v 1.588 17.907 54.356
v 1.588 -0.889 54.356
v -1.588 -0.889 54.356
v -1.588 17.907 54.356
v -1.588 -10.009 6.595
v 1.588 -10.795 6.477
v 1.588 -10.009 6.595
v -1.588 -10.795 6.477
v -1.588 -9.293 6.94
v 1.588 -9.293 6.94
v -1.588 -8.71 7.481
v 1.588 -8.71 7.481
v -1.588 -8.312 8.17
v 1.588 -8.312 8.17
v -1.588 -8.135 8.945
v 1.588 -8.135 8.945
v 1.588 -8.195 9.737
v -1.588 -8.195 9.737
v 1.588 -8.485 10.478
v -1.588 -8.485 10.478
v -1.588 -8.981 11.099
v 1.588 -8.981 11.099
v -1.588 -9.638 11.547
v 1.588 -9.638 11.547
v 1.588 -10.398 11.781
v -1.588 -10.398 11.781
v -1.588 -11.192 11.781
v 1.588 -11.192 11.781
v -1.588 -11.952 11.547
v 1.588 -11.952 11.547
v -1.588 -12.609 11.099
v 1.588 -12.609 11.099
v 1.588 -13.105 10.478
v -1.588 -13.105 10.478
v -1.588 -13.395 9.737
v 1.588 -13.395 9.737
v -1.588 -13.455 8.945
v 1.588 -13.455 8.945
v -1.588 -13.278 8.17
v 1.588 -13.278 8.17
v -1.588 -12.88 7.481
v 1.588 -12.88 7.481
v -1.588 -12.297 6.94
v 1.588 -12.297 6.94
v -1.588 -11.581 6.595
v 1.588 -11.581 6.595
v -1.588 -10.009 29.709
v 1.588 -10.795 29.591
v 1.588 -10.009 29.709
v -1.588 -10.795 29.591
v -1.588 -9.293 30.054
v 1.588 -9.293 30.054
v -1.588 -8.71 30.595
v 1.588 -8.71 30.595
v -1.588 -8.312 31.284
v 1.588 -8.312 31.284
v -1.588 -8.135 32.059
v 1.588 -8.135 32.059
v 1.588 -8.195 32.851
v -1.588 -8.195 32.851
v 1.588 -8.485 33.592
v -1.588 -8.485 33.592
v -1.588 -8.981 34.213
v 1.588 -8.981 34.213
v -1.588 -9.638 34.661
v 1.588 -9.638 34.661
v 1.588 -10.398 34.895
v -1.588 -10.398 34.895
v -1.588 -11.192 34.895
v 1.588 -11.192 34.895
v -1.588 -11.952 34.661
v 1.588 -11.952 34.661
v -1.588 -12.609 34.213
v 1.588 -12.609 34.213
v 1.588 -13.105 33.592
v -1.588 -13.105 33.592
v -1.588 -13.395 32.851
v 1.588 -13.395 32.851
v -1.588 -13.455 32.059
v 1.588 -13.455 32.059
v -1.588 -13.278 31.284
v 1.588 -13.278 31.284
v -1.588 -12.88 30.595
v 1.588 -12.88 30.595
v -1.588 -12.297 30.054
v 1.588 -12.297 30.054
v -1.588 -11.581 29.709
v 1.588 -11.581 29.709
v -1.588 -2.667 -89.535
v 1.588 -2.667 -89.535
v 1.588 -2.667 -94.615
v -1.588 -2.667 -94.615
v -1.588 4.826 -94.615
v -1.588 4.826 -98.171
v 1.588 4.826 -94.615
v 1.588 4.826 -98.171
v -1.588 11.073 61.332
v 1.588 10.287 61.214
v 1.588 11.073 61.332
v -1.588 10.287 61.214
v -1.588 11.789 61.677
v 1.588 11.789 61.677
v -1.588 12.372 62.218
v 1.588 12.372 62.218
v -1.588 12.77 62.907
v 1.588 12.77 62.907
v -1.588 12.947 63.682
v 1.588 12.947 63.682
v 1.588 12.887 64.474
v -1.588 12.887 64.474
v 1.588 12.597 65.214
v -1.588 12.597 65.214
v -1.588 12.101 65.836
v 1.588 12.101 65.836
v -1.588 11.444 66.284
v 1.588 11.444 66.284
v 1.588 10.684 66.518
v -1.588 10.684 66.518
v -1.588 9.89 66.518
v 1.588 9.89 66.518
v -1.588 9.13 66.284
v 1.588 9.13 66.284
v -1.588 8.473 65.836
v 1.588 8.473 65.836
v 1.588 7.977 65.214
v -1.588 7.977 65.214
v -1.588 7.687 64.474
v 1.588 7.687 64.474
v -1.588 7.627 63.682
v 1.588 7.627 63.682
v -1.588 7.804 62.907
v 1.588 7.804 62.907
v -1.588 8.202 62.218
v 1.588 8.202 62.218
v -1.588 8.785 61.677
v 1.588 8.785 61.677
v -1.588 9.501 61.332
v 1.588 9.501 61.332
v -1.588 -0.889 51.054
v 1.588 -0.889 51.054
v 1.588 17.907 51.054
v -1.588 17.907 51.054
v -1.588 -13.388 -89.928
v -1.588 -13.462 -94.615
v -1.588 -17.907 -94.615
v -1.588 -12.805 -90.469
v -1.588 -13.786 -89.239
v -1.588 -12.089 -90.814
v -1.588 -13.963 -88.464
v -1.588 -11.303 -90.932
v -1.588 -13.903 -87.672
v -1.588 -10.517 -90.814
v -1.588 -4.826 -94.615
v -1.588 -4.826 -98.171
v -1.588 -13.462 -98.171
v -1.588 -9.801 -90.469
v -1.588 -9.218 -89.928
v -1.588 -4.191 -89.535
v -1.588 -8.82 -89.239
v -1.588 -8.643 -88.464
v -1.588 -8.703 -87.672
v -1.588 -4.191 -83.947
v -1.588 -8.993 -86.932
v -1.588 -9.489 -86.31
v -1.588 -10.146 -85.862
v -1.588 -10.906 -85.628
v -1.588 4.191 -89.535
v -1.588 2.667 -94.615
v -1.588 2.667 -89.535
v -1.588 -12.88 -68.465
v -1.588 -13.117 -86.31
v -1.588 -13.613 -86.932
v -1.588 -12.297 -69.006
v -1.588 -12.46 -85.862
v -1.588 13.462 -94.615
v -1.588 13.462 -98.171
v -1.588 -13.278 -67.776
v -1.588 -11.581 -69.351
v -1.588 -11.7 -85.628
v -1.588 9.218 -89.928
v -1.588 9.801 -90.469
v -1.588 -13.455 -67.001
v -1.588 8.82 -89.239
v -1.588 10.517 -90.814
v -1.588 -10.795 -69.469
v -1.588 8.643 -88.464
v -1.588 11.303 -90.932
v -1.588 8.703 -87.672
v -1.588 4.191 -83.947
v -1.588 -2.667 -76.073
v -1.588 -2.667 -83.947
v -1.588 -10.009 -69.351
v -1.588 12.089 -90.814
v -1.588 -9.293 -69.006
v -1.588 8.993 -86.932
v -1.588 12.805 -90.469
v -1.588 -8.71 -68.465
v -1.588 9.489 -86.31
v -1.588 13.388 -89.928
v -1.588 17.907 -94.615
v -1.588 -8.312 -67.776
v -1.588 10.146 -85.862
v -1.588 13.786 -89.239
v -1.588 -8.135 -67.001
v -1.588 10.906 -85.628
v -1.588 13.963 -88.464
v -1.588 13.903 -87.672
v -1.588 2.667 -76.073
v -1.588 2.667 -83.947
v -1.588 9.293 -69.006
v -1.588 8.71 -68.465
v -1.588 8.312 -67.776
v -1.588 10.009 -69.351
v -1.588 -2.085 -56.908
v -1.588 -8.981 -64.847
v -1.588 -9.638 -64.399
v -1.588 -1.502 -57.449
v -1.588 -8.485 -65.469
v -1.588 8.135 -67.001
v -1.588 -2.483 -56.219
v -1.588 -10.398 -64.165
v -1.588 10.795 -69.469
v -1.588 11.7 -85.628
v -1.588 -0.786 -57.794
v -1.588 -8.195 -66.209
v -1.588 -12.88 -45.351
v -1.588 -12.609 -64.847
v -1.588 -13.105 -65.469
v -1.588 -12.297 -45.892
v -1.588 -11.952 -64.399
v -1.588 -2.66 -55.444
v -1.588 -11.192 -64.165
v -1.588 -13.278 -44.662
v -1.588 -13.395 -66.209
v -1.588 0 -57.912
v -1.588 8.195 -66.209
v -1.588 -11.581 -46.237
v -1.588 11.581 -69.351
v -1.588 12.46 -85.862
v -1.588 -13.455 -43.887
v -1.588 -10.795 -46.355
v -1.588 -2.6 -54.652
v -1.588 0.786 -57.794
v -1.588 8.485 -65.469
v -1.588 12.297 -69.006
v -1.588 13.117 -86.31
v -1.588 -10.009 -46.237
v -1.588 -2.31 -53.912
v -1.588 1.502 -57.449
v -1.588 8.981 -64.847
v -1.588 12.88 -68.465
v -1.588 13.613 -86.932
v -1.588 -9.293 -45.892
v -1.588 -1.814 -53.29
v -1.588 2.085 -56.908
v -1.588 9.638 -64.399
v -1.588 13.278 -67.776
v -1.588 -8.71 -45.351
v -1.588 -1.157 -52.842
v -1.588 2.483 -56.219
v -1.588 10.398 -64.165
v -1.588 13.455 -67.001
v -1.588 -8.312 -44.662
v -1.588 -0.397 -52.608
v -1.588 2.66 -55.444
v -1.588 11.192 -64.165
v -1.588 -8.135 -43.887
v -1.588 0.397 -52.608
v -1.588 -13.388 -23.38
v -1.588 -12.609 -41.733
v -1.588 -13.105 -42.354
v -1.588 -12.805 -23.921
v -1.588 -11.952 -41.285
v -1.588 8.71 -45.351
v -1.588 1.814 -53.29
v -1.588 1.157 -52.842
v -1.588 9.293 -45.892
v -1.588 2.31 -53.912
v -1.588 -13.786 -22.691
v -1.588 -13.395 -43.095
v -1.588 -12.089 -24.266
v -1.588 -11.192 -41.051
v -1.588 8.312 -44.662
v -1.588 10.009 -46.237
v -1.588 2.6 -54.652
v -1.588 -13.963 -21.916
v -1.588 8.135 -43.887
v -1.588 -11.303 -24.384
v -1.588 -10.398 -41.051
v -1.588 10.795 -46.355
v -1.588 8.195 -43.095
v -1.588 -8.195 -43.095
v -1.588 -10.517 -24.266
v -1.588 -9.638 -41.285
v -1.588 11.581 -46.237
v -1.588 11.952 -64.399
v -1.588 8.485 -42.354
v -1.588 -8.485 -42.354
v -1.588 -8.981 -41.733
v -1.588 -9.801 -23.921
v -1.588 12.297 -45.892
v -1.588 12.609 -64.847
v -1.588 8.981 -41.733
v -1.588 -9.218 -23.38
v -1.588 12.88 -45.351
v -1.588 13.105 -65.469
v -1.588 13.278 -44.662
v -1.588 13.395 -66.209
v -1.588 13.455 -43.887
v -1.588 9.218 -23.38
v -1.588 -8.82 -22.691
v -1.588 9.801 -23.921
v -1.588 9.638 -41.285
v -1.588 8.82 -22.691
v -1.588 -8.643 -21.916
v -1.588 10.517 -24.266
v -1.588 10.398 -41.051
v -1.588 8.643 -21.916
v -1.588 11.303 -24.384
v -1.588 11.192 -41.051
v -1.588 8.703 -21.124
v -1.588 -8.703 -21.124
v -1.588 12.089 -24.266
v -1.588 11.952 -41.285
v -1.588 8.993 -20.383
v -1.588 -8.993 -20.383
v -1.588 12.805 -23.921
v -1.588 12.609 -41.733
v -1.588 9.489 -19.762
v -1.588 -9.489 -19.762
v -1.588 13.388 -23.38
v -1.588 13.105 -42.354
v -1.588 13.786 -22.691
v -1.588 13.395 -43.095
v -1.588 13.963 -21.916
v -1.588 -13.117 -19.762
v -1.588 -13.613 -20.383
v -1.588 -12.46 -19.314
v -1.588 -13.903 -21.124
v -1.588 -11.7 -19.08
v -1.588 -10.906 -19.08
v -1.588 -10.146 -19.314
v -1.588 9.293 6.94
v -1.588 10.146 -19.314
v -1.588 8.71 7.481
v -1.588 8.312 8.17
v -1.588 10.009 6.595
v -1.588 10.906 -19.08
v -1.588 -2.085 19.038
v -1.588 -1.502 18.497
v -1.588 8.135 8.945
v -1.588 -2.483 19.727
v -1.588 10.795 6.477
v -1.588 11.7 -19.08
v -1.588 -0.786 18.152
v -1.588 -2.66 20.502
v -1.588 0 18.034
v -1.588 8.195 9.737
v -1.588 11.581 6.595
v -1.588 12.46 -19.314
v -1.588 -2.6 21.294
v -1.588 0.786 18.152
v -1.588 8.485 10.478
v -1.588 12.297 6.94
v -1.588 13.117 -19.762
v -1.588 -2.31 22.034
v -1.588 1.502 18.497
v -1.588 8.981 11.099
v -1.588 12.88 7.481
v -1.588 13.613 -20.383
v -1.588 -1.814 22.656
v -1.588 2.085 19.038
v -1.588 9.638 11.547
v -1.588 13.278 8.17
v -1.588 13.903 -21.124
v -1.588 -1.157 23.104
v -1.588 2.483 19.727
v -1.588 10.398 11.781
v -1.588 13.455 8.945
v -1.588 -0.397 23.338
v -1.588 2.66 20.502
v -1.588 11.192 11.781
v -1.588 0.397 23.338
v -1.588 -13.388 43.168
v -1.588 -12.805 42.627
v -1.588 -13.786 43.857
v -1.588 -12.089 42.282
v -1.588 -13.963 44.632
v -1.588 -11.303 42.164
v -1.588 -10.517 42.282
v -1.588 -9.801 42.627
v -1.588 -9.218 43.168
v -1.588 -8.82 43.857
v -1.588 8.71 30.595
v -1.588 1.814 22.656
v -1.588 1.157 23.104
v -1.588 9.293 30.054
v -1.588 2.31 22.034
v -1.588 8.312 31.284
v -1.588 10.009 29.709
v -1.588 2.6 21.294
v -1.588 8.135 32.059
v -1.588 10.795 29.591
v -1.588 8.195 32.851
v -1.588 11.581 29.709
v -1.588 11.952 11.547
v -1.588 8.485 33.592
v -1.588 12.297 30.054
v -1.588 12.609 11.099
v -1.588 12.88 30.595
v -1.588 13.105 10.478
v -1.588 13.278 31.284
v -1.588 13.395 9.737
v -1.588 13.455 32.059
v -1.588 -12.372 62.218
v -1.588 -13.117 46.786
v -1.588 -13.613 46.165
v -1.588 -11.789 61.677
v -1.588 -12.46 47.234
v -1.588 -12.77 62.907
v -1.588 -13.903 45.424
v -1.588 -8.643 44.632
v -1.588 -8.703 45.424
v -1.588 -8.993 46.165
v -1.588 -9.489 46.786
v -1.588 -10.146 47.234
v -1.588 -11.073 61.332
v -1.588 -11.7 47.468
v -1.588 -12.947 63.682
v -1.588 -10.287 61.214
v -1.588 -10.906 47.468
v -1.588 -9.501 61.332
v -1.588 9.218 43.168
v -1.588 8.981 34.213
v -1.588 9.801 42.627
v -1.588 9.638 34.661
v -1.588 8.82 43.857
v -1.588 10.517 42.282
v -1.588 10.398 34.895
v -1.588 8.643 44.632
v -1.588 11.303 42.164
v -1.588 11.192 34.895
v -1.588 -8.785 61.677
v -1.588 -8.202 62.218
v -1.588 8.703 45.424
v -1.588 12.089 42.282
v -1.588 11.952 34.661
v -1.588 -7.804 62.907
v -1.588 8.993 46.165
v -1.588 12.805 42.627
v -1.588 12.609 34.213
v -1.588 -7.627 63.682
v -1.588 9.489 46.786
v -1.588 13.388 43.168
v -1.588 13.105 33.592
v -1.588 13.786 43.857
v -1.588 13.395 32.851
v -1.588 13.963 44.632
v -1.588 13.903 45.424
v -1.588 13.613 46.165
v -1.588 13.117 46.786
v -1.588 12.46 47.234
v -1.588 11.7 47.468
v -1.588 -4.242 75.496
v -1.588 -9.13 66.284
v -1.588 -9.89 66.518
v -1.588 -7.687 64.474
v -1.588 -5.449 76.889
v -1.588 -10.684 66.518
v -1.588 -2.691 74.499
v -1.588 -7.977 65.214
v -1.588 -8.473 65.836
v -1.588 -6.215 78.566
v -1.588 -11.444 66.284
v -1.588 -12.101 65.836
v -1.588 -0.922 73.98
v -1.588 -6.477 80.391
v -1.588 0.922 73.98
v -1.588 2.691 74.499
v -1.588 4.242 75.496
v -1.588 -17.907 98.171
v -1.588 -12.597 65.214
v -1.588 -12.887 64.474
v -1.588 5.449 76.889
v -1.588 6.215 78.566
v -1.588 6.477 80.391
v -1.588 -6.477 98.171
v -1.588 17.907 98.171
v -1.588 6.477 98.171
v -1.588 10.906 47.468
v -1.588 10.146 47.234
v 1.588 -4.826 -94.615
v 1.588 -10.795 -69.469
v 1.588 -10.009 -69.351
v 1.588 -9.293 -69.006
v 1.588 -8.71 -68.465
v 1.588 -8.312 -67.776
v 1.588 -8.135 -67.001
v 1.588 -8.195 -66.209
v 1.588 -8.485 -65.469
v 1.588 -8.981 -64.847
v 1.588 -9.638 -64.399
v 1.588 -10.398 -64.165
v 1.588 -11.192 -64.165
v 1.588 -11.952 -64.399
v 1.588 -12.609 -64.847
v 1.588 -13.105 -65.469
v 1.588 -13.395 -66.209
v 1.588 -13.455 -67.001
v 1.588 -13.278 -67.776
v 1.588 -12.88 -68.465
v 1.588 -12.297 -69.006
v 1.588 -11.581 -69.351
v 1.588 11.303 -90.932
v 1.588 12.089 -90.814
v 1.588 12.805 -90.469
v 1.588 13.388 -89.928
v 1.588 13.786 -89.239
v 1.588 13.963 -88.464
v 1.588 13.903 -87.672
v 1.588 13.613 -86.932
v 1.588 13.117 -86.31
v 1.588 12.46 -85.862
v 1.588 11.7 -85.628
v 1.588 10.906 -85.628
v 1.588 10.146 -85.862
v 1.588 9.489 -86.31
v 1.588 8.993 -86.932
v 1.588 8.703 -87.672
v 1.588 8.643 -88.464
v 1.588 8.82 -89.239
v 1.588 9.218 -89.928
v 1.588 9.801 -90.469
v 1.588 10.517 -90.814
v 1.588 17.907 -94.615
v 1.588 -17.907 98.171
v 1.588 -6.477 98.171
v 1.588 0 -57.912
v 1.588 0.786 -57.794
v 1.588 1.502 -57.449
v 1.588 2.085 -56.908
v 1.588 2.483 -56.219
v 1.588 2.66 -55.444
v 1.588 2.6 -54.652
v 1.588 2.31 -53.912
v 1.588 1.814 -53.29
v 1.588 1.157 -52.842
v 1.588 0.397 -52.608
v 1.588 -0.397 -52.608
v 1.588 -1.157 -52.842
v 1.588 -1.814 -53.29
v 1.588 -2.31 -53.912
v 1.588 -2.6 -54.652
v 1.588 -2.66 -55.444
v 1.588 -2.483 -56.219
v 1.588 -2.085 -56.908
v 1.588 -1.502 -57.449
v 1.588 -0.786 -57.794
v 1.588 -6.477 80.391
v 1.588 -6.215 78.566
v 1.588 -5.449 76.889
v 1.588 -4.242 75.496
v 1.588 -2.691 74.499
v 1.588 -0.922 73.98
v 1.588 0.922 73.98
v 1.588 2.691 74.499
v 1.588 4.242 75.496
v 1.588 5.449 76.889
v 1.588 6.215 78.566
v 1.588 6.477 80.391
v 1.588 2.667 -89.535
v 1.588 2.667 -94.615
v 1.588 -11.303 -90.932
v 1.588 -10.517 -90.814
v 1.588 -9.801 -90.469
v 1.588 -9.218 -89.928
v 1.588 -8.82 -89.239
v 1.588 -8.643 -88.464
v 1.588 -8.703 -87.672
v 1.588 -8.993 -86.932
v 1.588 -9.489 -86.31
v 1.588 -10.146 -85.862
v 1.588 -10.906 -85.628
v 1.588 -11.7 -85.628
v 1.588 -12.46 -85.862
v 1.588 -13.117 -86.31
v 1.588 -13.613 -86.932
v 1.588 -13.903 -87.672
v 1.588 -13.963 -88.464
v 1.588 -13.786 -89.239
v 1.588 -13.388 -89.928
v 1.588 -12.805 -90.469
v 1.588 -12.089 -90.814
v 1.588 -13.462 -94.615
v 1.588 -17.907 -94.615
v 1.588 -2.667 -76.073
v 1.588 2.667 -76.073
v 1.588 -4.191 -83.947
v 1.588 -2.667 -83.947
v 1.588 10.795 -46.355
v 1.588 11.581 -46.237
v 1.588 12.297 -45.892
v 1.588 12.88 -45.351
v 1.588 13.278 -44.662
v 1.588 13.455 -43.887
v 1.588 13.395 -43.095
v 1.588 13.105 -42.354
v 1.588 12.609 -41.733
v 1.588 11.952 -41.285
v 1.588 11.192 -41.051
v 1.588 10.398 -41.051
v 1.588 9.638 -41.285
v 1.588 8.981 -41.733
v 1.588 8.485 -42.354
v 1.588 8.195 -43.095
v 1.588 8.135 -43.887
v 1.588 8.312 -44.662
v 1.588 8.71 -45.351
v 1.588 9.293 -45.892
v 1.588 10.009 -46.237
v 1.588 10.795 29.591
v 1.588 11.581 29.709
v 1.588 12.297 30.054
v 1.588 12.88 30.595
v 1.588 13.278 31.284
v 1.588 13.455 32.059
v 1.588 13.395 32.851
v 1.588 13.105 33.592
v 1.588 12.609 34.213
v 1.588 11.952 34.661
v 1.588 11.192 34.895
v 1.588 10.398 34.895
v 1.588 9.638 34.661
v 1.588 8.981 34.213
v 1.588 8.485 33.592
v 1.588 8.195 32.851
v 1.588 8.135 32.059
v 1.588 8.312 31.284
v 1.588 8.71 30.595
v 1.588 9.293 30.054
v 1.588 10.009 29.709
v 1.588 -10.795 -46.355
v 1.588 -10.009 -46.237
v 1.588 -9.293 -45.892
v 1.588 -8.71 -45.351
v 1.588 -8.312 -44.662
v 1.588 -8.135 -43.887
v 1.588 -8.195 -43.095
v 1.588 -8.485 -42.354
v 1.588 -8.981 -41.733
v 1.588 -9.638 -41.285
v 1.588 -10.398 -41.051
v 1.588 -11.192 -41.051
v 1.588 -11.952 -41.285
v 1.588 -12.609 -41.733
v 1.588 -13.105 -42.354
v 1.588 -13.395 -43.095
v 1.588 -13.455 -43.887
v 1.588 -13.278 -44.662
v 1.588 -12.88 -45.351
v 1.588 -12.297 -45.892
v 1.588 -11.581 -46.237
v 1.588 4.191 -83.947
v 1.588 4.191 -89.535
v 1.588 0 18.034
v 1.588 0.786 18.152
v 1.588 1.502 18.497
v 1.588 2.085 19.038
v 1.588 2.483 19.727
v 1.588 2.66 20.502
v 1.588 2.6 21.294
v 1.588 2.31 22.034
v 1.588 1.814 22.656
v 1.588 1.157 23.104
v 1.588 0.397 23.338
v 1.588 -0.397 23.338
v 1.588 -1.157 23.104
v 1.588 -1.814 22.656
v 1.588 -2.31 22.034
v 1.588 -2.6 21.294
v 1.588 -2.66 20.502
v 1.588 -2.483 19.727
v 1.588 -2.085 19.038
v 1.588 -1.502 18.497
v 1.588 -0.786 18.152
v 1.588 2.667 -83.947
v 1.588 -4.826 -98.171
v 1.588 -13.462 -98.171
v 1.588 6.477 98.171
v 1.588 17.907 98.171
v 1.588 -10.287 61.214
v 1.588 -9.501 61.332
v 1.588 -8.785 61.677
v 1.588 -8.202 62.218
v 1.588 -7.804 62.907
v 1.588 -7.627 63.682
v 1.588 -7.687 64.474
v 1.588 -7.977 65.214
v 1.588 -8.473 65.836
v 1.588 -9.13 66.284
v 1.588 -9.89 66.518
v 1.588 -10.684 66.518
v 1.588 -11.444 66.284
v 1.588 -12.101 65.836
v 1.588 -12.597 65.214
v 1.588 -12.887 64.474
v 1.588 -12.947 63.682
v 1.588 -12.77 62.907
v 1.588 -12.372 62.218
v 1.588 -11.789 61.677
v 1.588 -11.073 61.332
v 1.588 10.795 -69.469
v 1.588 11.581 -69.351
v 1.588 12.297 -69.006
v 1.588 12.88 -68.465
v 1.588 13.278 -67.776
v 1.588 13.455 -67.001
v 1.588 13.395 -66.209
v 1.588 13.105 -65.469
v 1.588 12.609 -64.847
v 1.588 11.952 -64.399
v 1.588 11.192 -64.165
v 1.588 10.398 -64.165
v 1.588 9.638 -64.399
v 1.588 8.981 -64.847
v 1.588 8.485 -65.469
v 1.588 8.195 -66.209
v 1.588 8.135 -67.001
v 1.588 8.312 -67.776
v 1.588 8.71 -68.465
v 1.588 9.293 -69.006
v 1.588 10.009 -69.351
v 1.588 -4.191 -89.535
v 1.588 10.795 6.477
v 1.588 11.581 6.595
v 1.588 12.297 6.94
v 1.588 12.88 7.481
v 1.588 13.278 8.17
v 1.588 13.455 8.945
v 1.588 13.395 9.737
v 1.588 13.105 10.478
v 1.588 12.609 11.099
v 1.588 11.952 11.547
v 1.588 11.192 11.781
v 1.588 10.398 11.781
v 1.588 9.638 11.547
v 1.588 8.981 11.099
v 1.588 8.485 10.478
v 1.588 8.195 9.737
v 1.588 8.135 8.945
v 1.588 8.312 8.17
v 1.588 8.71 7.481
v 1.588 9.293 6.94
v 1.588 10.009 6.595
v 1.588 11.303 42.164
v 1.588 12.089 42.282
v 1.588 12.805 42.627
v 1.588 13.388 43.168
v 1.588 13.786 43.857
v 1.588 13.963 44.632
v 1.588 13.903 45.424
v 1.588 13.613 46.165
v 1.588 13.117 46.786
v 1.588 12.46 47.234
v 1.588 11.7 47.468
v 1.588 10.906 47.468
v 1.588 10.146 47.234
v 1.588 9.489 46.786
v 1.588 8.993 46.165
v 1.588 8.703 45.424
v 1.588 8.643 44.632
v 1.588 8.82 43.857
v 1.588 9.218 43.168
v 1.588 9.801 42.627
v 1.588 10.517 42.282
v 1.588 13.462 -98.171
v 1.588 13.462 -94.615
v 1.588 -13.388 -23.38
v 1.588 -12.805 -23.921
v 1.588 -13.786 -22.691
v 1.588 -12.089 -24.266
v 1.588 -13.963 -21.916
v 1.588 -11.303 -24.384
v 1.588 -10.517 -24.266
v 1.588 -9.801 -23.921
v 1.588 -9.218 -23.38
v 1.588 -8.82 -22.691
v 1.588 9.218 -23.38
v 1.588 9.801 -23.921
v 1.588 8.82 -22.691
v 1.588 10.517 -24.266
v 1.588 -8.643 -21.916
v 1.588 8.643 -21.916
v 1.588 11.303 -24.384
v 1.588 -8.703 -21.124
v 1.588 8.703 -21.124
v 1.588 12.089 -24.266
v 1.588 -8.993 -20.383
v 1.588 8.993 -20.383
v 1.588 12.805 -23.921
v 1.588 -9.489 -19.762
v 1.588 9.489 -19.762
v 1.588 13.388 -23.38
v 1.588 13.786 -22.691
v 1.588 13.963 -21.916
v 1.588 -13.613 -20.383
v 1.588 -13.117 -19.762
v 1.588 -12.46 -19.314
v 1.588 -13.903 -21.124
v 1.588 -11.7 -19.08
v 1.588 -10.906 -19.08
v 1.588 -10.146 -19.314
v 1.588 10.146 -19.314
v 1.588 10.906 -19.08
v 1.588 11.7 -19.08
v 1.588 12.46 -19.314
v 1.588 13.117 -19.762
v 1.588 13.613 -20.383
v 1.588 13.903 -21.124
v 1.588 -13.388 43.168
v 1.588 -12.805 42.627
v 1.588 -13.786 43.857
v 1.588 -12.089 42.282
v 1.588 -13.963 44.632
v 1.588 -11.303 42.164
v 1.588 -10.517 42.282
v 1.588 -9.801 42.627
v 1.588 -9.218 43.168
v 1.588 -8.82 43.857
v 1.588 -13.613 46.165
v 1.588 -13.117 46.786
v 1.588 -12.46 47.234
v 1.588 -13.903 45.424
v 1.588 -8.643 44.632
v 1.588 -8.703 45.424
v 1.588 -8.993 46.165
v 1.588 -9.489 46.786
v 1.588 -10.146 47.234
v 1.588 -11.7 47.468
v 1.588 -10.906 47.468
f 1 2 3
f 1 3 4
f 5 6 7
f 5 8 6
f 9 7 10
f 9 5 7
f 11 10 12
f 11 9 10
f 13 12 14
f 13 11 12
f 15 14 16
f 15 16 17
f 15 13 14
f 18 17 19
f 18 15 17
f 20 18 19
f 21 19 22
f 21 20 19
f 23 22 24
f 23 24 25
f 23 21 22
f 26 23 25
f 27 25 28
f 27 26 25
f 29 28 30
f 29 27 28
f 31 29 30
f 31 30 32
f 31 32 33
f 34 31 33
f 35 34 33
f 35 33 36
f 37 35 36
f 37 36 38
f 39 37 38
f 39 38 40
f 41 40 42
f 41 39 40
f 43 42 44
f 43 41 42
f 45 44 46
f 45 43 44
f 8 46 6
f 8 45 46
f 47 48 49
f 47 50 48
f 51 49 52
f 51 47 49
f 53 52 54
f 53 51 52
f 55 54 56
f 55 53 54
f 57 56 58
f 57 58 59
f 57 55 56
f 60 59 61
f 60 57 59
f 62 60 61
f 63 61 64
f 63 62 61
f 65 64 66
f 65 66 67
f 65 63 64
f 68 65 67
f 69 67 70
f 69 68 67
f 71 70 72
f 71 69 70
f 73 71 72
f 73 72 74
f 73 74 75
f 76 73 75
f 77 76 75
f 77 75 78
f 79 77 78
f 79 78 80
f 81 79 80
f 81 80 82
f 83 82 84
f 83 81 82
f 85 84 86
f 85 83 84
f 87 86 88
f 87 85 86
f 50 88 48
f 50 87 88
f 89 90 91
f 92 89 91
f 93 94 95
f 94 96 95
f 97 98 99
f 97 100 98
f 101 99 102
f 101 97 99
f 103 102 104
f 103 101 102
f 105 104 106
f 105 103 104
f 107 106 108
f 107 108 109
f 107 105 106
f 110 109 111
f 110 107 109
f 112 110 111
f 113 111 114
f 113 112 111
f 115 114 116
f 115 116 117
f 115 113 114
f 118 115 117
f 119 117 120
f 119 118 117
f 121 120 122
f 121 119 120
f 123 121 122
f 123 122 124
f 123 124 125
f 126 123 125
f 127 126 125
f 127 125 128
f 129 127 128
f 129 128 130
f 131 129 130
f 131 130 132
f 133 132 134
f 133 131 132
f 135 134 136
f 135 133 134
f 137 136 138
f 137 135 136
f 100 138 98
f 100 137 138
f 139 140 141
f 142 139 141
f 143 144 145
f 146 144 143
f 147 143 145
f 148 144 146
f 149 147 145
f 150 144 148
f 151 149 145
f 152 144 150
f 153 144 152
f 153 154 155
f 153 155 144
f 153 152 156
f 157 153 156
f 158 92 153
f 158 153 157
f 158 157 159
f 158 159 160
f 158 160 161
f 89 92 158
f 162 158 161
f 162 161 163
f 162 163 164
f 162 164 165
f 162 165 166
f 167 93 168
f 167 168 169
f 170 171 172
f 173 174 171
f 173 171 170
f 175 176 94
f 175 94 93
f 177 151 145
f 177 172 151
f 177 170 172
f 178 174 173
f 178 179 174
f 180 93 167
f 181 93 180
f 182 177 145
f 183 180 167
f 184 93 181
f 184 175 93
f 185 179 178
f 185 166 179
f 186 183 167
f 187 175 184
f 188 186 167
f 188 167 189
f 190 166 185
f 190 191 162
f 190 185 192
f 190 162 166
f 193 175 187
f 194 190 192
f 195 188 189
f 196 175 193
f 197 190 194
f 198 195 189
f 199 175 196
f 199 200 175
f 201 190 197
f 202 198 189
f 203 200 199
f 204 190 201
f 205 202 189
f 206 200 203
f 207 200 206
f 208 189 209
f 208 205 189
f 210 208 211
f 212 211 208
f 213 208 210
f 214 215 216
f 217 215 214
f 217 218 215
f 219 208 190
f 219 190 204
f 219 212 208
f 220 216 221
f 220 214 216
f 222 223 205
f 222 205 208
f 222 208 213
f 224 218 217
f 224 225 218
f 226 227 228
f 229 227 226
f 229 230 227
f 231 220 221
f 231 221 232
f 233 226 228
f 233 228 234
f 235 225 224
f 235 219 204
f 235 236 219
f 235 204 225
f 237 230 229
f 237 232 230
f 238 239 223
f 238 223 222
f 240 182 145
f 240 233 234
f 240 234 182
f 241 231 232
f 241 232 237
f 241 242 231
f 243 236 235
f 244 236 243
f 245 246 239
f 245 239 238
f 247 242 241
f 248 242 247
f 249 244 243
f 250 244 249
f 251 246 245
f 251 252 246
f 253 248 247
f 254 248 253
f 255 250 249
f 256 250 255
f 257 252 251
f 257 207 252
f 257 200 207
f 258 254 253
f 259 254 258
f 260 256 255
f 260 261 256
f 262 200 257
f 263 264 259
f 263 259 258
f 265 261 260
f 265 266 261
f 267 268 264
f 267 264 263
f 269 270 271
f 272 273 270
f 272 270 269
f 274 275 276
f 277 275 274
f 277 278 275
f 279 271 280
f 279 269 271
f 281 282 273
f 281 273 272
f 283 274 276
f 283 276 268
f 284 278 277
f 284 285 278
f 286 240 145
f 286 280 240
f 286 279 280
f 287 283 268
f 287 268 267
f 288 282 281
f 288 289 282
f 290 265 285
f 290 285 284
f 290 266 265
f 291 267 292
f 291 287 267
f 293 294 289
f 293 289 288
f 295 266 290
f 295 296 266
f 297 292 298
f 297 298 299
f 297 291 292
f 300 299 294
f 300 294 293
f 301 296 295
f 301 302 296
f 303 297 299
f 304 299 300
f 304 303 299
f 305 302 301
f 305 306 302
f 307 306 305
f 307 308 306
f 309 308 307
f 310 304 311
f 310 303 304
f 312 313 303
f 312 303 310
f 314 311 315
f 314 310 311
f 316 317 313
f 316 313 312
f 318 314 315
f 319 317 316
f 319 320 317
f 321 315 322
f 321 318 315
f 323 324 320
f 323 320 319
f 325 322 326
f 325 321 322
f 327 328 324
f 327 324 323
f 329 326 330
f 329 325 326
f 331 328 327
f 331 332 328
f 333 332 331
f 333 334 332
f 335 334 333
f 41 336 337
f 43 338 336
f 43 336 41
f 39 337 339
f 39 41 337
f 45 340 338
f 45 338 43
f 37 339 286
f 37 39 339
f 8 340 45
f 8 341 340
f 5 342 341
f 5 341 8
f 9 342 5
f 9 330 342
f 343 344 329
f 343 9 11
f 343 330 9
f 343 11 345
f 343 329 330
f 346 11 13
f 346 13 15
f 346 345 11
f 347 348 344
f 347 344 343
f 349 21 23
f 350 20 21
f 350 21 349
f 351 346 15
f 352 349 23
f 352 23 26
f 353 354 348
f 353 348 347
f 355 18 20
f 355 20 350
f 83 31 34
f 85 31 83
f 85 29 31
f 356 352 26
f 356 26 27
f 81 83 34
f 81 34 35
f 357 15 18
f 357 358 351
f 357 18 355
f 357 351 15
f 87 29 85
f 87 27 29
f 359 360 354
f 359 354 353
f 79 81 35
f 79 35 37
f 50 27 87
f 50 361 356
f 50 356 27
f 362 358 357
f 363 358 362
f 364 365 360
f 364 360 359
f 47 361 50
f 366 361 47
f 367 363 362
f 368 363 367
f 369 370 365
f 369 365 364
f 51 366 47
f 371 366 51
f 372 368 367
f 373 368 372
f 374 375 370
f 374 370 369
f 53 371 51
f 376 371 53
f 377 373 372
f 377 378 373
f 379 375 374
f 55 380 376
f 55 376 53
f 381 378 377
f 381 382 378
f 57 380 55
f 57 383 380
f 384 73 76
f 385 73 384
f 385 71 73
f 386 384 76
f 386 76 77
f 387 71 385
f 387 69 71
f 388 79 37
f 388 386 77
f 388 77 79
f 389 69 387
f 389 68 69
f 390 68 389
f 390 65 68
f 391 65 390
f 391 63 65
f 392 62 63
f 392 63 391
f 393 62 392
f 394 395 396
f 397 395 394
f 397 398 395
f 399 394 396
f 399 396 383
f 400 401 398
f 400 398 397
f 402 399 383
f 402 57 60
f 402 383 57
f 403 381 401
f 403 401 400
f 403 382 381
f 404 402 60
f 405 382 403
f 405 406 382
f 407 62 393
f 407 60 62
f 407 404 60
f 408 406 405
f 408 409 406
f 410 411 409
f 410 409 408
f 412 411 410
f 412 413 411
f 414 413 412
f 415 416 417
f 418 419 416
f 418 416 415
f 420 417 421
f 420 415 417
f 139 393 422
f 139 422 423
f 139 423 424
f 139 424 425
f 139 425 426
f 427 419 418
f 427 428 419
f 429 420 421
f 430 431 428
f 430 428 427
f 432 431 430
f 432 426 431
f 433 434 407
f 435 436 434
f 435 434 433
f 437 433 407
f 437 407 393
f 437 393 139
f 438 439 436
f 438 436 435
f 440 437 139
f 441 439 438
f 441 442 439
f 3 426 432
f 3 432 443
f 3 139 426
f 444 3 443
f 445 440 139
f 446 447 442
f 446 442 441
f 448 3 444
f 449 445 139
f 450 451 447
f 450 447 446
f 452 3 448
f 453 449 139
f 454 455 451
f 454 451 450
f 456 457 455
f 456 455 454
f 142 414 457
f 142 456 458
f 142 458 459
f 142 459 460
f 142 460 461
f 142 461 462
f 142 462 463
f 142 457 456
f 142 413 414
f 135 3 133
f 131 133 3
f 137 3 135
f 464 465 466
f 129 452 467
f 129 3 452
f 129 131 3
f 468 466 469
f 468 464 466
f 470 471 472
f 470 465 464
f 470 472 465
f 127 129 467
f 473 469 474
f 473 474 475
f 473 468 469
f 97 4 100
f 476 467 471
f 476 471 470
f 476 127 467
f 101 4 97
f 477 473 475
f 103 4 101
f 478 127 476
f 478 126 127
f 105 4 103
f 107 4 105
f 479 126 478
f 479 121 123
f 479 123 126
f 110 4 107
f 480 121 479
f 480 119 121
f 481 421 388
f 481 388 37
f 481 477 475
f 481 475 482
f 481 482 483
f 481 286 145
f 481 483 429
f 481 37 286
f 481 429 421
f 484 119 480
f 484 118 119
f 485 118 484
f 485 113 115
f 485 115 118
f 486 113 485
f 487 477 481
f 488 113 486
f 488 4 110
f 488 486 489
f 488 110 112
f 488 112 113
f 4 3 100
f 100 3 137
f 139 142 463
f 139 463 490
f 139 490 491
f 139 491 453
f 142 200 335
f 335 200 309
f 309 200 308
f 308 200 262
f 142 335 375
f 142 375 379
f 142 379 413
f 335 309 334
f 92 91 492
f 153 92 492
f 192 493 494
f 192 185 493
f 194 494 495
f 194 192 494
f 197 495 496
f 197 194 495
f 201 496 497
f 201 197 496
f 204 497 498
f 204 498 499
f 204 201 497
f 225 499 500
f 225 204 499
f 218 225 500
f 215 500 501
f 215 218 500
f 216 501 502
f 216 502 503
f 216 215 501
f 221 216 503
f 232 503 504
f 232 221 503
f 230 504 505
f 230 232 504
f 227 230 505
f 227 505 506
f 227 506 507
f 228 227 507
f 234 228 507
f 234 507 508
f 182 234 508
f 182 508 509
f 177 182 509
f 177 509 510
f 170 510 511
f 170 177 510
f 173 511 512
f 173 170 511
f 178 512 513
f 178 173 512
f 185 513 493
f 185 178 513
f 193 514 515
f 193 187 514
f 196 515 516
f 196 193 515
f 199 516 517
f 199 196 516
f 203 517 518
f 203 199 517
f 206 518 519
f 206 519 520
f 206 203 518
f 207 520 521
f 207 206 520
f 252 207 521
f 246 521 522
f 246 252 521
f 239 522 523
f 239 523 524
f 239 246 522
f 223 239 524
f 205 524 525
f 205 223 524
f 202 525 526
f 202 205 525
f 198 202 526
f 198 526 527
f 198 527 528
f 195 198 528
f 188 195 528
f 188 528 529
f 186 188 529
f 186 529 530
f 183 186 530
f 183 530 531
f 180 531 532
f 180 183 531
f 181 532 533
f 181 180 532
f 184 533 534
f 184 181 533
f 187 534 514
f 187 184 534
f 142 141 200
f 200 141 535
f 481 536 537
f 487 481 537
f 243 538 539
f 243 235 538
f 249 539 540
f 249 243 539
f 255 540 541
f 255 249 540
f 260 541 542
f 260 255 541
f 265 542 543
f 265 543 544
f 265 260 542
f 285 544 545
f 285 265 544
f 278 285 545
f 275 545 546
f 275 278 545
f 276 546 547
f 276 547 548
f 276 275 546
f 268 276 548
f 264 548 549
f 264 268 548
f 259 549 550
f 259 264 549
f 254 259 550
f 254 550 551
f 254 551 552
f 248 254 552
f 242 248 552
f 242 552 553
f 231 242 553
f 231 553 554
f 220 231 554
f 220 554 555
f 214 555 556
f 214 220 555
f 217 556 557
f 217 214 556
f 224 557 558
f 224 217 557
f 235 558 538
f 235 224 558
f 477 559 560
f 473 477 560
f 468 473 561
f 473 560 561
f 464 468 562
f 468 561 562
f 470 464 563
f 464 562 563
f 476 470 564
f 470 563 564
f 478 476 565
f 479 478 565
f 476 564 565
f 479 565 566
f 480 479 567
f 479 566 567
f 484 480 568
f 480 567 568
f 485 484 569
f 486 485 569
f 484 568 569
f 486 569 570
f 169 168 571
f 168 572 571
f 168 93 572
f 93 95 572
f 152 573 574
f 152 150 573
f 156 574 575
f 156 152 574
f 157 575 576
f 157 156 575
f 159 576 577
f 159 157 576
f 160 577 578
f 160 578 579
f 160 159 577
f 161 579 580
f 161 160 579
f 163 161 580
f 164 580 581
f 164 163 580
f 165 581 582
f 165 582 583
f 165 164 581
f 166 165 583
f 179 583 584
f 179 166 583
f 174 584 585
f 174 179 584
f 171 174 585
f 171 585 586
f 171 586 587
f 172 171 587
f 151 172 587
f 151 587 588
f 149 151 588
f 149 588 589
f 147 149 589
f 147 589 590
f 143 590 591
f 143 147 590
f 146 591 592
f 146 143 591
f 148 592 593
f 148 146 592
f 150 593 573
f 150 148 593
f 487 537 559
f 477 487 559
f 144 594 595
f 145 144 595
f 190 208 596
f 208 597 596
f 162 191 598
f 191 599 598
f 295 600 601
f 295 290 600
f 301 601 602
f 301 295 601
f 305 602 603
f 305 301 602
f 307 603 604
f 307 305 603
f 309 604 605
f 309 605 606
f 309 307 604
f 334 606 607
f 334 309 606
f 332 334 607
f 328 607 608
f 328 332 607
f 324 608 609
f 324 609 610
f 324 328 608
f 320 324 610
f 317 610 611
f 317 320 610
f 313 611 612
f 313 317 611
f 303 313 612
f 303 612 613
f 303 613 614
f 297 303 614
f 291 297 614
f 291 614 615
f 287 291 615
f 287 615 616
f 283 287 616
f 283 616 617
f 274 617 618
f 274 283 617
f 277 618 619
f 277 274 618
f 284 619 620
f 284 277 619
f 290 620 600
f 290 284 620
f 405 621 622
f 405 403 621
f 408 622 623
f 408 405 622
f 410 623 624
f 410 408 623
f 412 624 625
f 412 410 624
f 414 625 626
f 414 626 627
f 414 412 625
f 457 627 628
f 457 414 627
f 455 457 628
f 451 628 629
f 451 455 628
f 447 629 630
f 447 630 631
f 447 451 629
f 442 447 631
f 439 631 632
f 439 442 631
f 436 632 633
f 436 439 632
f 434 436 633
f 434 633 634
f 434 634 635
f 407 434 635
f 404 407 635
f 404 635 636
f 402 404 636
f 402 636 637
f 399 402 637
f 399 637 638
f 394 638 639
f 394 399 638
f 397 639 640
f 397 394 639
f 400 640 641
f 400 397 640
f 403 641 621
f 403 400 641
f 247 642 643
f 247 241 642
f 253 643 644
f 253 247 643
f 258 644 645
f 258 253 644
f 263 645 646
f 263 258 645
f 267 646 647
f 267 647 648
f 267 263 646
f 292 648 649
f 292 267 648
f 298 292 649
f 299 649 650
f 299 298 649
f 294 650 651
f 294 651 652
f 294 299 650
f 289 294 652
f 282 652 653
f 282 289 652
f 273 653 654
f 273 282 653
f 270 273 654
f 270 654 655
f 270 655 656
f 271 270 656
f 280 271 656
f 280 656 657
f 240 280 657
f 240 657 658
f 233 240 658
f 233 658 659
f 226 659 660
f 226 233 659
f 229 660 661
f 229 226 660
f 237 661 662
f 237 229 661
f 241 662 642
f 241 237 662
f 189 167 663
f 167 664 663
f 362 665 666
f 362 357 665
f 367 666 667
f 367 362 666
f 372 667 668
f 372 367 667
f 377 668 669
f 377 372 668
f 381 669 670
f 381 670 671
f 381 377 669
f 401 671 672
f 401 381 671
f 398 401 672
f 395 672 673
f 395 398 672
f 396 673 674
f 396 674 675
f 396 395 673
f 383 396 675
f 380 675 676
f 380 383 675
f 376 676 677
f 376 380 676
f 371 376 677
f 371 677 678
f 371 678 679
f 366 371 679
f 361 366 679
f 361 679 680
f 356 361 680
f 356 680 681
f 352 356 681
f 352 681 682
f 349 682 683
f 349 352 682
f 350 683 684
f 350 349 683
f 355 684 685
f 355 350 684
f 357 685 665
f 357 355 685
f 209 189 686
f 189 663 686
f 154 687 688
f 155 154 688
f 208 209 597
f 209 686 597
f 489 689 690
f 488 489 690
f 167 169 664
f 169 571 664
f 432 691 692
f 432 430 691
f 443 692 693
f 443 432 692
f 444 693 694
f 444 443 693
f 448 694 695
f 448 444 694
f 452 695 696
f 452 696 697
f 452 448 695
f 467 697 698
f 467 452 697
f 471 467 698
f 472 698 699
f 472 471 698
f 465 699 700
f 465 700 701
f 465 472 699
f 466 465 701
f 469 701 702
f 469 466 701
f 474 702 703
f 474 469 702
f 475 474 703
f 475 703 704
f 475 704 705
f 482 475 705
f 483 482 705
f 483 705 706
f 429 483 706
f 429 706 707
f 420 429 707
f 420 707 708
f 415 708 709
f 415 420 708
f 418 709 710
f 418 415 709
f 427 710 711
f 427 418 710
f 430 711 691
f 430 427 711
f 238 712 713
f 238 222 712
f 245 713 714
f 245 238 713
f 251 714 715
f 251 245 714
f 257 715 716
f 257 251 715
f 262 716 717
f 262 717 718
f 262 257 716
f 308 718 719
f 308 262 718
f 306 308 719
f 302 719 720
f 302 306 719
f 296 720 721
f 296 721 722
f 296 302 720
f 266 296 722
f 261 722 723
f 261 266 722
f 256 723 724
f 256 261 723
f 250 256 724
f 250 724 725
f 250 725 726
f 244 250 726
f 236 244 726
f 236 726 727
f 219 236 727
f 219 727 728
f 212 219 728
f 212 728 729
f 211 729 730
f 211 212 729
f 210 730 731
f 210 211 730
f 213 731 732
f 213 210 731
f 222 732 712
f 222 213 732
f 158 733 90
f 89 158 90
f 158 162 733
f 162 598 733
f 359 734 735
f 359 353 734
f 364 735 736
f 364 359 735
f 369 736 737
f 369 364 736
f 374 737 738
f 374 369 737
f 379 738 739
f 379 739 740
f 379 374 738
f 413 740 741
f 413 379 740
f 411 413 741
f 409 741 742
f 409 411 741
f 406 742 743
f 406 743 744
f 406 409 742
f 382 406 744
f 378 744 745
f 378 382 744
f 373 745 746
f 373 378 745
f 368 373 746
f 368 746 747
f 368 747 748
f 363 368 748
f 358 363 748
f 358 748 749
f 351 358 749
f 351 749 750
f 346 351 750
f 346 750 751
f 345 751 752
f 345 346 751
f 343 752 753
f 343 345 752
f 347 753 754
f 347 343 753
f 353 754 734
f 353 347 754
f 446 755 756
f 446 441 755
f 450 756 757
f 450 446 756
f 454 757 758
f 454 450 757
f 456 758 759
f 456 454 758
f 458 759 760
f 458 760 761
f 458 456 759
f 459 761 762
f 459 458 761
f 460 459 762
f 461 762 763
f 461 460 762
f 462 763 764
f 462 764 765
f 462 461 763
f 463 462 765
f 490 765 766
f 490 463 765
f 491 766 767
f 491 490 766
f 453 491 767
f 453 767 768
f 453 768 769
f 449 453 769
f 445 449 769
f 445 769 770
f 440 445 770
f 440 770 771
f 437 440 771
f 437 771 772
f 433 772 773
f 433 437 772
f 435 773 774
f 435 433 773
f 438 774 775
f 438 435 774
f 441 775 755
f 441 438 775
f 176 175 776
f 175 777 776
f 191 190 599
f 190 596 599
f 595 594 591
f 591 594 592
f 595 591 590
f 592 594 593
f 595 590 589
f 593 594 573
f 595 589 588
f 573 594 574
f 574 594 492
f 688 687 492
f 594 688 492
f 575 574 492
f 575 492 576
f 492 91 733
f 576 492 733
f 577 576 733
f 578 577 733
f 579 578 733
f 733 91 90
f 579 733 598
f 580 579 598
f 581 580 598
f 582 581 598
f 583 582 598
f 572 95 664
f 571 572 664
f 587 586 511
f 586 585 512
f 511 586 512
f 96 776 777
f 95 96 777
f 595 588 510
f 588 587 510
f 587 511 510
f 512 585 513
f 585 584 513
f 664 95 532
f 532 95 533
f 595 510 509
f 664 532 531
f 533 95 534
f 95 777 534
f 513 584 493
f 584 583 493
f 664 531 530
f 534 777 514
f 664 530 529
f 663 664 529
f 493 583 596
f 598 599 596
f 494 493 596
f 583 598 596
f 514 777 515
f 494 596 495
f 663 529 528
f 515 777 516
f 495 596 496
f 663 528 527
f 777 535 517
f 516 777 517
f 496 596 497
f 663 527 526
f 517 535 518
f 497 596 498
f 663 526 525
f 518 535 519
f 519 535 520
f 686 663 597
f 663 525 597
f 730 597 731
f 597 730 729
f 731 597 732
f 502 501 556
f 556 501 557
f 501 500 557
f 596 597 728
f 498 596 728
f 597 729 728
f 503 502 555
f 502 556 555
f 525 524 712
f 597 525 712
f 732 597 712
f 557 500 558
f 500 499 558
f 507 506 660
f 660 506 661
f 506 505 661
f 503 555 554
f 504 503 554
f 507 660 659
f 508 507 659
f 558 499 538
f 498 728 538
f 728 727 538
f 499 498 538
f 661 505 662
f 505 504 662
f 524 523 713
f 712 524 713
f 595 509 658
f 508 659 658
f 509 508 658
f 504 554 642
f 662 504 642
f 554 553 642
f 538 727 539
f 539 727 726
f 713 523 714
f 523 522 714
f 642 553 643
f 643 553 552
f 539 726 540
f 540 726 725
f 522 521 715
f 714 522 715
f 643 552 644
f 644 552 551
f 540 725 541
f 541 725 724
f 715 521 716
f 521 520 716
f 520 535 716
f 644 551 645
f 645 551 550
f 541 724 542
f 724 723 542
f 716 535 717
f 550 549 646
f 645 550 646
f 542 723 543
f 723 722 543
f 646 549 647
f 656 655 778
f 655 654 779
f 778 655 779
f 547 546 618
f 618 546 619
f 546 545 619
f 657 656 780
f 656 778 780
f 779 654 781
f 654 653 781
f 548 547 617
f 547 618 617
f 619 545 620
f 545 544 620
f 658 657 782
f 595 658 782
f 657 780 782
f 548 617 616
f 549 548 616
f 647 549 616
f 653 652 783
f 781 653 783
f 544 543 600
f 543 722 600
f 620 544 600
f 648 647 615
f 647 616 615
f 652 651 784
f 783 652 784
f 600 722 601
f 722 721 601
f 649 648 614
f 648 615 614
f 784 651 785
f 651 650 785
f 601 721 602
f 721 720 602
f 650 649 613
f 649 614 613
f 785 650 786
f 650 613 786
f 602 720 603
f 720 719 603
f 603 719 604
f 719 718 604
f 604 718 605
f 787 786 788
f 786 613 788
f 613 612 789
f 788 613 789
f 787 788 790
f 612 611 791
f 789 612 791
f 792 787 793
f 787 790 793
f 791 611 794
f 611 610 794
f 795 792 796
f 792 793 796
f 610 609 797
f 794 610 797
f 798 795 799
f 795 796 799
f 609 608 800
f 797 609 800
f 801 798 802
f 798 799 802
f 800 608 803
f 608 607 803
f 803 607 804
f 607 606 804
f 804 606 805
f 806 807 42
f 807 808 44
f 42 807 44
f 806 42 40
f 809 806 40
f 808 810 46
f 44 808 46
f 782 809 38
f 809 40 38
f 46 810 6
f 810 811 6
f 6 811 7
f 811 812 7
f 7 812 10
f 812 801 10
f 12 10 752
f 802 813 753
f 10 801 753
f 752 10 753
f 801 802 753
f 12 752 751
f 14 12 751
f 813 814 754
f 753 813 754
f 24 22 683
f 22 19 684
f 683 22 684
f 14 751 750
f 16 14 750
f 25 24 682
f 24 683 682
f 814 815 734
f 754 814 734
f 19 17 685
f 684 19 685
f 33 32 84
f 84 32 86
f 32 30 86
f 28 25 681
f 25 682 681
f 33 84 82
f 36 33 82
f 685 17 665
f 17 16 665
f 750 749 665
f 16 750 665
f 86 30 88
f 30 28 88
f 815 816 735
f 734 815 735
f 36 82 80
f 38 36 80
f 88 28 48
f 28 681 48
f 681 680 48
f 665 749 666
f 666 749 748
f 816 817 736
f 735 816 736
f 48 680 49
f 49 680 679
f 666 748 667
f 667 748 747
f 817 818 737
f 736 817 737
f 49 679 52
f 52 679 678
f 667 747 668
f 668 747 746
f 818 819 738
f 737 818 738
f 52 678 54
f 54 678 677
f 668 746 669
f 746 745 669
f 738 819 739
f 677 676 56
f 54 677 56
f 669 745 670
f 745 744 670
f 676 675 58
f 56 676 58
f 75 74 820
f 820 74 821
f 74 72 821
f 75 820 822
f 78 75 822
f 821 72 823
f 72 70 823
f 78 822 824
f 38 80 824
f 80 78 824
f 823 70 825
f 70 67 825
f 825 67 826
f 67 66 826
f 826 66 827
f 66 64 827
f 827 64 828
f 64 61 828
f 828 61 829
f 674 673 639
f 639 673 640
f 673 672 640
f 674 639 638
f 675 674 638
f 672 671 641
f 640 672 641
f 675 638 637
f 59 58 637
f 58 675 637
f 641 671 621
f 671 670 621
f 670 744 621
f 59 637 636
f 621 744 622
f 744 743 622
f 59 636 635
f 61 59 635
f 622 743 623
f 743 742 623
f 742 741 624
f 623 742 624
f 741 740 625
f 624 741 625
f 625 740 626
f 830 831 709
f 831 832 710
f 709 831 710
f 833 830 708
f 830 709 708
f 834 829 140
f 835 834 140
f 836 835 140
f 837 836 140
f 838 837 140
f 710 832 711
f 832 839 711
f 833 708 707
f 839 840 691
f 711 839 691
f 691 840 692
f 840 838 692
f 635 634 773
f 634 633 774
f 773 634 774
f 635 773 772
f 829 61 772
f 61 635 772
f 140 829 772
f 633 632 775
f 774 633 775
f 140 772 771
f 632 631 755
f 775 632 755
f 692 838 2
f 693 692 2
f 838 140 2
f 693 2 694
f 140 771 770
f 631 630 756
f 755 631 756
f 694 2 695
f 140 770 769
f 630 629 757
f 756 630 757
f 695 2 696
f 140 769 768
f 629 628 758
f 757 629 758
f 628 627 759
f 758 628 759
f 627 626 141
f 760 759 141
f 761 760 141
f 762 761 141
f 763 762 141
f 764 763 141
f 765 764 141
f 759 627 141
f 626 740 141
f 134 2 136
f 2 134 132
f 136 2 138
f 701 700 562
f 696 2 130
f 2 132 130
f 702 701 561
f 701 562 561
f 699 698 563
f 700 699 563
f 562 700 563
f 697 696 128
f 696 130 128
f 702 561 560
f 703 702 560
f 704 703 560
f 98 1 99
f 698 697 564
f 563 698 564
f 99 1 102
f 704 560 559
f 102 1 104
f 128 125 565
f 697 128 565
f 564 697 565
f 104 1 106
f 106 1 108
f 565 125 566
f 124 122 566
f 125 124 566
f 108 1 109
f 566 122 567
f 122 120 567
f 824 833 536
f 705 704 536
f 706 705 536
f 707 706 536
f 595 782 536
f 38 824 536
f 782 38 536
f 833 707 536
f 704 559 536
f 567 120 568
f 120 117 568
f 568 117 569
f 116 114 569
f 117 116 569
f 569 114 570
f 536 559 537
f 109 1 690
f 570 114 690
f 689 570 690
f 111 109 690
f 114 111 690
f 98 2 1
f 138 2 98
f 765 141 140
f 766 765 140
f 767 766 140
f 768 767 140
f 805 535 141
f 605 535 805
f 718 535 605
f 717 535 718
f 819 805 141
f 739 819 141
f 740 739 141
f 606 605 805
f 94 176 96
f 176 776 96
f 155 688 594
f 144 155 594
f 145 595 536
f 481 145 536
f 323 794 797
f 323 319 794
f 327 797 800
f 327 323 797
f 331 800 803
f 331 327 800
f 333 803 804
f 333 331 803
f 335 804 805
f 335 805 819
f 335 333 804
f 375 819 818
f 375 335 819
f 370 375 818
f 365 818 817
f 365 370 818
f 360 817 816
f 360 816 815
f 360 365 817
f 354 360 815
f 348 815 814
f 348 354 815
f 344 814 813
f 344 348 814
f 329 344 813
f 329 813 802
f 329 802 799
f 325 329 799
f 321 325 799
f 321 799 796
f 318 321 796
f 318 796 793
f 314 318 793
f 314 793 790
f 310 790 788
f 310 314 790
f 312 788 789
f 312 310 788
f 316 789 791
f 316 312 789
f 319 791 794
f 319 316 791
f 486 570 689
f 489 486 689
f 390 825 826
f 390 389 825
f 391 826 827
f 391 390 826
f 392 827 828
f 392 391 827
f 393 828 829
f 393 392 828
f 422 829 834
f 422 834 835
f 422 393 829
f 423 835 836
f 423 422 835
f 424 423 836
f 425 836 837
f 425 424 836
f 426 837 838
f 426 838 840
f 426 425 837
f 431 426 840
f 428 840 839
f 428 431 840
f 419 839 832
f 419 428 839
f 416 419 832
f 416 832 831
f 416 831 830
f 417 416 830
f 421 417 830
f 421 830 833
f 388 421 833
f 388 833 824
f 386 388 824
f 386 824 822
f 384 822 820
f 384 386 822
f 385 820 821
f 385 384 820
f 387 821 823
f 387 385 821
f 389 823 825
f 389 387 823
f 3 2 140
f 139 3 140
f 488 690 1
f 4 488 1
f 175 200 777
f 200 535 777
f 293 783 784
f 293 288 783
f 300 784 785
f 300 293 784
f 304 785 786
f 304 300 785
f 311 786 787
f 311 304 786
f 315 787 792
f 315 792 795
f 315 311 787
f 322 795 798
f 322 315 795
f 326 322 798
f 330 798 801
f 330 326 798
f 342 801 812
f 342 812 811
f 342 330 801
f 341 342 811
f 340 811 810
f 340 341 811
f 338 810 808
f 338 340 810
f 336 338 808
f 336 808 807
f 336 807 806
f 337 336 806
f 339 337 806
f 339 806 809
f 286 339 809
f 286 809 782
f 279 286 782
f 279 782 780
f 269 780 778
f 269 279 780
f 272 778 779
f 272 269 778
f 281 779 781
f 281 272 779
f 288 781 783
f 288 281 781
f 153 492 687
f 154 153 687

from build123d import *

# Parameters (mm, degrees)
SKETCH1_R           = 2.667
BOSS_EXTRUDE1_DEPTH = 1.5875
SKETCH2_W           = 3.302
SKETCH2_H           = 18.796
CUT_EXTRUDE1_DEPTH  = 4.175


with BuildPart() as part:
    # Sketch1 → Boss-Extrude1 (new body, symmetric)
    with BuildSketch(Plane(origin=(0, 0, 0), x_dir=(0, 0, -1), z_dir=(1, 0, 0))):
        with BuildLine():
            Line((-98.171, 17.907), (94.615, 17.907))
            Line((94.615, 17.907), (94.615, 13.462))
            Line((94.615, 13.462), (98.171, 13.462))
            Line((98.171, 13.462), (98.171, 4.826))
            Line((98.171, 4.826), (94.615, 4.826))
            Line((94.615, 4.826), (94.615, 2.667))
            Line((94.615, 2.667), (89.535, 2.667))
            Line((89.535, 2.667), (89.535, 4.191))
            Line((89.535, 4.191), (83.947, 4.191))
            Line((83.947, 4.191), (83.947, 2.667))
            Line((83.947, 2.667), (76.073, 2.667))
            Line((76.073, 2.667), (76.073, -2.667))
            Line((76.073, -2.667), (83.947, -2.667))
            Line((83.947, -2.667), (83.947, -4.191))
            Line((83.947, -4.191), (89.535, -4.191))
            Line((89.535, -4.191), (89.535, -2.667))
            Line((89.535, -2.667), (94.615, -2.667))
            Line((94.615, -2.667), (94.615, -4.826))
            Line((94.615, -4.826), (98.171, -4.826))
            Line((98.171, -4.826), (98.171, -13.462))
            Line((98.171, -13.462), (94.615, -13.462))
            Line((94.615, -13.462), (94.615, -17.907))
            Line((94.615, -17.907), (-98.171, -17.907))
            Line((-98.171, -17.907), (-98.171, -6.477))
            Line((-98.171, -6.477), (-80.391, -6.477))
            ThreePointArc((-80.391, -6.477), (-73.914, 0), (-80.391, 6.477))
            Line((-80.391, 6.477), (-98.171, 6.477))
            Line((-98.171, 6.477), (-98.171, 17.907))
        make_face()
        with Locations((-63.881, 10.287)):
            Circle(SKETCH1_R, mode=Mode.SUBTRACT)
        with Locations((-63.881, -10.287)):
            Circle(SKETCH1_R, mode=Mode.SUBTRACT)
        with Locations((-44.831, 11.303)):
            Circle(SKETCH1_R, mode=Mode.SUBTRACT)
        with Locations((21.717, 11.303)):
            Circle(SKETCH1_R, mode=Mode.SUBTRACT)
        with Locations((88.265, 11.303)):
            Circle(SKETCH1_R, mode=Mode.SUBTRACT)
        with Locations((88.265, -11.303)):
            Circle(SKETCH1_R, mode=Mode.SUBTRACT)
        with Locations((21.717, -11.303)):
            Circle(SKETCH1_R, mode=Mode.SUBTRACT)
        with Locations((-44.831, -11.303)):
            Circle(SKETCH1_R, mode=Mode.SUBTRACT)
        with Locations((-9.144, 10.795)):
            Circle(SKETCH1_R, mode=Mode.SUBTRACT)
        with Locations((-32.258, 10.795)):
            Circle(SKETCH1_R, mode=Mode.SUBTRACT)
        with Locations((66.802, 10.795)):
            Circle(SKETCH1_R, mode=Mode.SUBTRACT)
        with Locations((43.688, 10.795)):
            Circle(SKETCH1_R, mode=Mode.SUBTRACT)
        with Locations((43.688, -10.795)):
            Circle(SKETCH1_R, mode=Mode.SUBTRACT)
        with Locations((66.802, -10.795)):
            Circle(SKETCH1_R, mode=Mode.SUBTRACT)
        with Locations((-32.258, -10.795)):
            Circle(SKETCH1_R, mode=Mode.SUBTRACT)
        with Locations((-9.144, -10.795)):
            Circle(SKETCH1_R, mode=Mode.SUBTRACT)
        with Locations((-20.701, 0)):
            Circle(SKETCH1_R, mode=Mode.SUBTRACT)
        with Locations((55.245, 0)):
            Circle(SKETCH1_R, mode=Mode.SUBTRACT)
    extrude(amount=BOSS_EXTRUDE1_DEPTH, both=True)

    # Sketch2 → Cut-Extrude1 (cut, through all)
    with BuildSketch(Plane(origin=(1.5875, 0, 0), x_dir=(0, 0, -1), z_dir=(1, 0, 0))):
        with Locations((-52.705, 8.509)):
            Rectangle(SKETCH2_W, SKETCH2_H)
    extrude(amount=-CUT_EXTRUDE1_DEPTH, mode=Mode.SUBTRACT)


solid = part.part
